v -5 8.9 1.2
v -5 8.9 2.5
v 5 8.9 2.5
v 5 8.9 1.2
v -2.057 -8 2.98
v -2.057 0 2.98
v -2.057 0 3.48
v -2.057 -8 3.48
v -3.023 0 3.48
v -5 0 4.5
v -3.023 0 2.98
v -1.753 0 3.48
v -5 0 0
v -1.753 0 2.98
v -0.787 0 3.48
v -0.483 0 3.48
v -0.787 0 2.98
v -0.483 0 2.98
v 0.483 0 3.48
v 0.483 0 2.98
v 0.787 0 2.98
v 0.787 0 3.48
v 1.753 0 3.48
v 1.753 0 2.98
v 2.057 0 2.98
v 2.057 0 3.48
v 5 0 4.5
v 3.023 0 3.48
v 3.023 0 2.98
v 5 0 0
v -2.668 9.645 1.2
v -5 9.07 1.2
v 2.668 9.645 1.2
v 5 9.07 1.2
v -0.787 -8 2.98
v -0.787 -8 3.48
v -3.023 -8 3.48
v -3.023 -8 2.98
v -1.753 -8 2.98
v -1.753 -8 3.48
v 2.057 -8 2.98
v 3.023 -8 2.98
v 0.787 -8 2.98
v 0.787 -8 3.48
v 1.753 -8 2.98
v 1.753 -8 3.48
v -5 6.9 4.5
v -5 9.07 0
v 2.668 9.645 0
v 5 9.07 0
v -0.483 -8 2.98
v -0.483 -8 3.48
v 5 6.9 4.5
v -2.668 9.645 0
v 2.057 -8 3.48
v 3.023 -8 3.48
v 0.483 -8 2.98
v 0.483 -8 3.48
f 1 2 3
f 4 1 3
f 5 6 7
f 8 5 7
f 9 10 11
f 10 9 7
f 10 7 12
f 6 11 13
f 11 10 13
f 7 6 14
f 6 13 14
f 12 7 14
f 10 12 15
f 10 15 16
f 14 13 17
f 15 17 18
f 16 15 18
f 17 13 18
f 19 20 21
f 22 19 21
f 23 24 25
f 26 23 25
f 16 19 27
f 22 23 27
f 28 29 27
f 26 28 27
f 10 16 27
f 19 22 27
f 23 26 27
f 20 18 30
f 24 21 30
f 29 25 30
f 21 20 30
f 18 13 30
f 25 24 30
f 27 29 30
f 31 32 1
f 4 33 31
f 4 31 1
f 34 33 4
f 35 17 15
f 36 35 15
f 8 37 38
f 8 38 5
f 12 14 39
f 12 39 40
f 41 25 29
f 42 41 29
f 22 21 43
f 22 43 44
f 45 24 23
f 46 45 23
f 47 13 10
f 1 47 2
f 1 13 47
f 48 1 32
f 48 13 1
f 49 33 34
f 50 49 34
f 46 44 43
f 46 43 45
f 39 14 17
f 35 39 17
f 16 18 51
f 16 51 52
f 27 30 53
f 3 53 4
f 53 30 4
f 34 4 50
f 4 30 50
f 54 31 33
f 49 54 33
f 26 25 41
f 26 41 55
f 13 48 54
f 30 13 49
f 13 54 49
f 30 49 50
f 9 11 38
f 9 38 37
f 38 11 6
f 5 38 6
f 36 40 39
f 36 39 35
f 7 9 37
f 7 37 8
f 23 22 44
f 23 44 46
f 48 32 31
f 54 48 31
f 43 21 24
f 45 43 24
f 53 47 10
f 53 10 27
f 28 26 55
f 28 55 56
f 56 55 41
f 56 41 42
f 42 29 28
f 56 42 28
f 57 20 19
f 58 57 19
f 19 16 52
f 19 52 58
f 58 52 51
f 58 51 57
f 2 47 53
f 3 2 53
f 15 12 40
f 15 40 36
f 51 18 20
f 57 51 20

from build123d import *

# Parameters (mm, degrees)
SKETCH_1_W          = 10
SKETCH_1_H          = 15.4
EXTRUDE_1_DEPTH     = 4.5
SKETCH_2_W          = 10
SKETCH_2_H          = 6.5
CUT_EXTRUDE_1_DEPTH = 3.3
CHAMFER_1_SIZE      = 2
CUT_EXTRUDE_2_DEPTH = 10
SKETCH_4_W          = 0.965597518
SKETCH_4_H          = 0.5
EXTRUDE_2_DEPTH     = 8


with BuildPart() as part:
    # 草图1 → 凸台-拉伸1 (new body)
    with BuildSketch(Plane.XY):
        with Locations((0, 7.7)):
            Rectangle(SKETCH_1_W, SKETCH_1_H)
    extrude(amount=EXTRUDE_1_DEPTH)

    # 草图2 → 切除-拉伸1 (cut)
    with BuildSketch(Plane.XY.offset(4.5)):
        with Locations((0, 12.15)):
            Rectangle(SKETCH_2_W, SKETCH_2_H)
    extrude(amount=-CUT_EXTRUDE_1_DEPTH, mode=Mode.SUBTRACT)

    # 倒角1
    chamfer_1_edges = [part.edges().sort_by_distance(p)[0] for p in [
        (0, 8.9, 4.5),
    ]]
    chamfer(chamfer_1_edges, length=CHAMFER_1_SIZE)

    # 草图5 → 切除-拉伸2 (cut)
    with BuildSketch(Plane.XY.offset(1.2)):
        Polygon((-5, 9.069569731), (-2.668025146, 9.645356545), (2.668025146, 9.645356545), (5, 9.069569731), (5, 15.4), (-5, 15.4), align=None)
    extrude(amount=-CUT_EXTRUDE_2_DEPTH, mode=Mode.SUBTRACT)

    # 草图4 → 凸台-拉伸2 (add)
    with BuildSketch(Plane.XZ):
        with Locations((1.27, 3.23)):
            Rectangle(SKETCH_4_W, SKETCH_4_H)
        with Locations((0, 3.23)):
            Rectangle(SKETCH_4_W, SKETCH_4_H)
        with Locations((-1.27, 3.23)):
            Rectangle(SKETCH_4_W, SKETCH_4_H)
        with Locations((-2.54, 3.23)):
            Rectangle(SKETCH_4_W, SKETCH_4_H)
        with Locations((2.54, 3.23)):
            Rectangle(SKETCH_4_W, SKETCH_4_H)
    extrude(amount=EXTRUDE_2_DEPTH)


solid = part.part
